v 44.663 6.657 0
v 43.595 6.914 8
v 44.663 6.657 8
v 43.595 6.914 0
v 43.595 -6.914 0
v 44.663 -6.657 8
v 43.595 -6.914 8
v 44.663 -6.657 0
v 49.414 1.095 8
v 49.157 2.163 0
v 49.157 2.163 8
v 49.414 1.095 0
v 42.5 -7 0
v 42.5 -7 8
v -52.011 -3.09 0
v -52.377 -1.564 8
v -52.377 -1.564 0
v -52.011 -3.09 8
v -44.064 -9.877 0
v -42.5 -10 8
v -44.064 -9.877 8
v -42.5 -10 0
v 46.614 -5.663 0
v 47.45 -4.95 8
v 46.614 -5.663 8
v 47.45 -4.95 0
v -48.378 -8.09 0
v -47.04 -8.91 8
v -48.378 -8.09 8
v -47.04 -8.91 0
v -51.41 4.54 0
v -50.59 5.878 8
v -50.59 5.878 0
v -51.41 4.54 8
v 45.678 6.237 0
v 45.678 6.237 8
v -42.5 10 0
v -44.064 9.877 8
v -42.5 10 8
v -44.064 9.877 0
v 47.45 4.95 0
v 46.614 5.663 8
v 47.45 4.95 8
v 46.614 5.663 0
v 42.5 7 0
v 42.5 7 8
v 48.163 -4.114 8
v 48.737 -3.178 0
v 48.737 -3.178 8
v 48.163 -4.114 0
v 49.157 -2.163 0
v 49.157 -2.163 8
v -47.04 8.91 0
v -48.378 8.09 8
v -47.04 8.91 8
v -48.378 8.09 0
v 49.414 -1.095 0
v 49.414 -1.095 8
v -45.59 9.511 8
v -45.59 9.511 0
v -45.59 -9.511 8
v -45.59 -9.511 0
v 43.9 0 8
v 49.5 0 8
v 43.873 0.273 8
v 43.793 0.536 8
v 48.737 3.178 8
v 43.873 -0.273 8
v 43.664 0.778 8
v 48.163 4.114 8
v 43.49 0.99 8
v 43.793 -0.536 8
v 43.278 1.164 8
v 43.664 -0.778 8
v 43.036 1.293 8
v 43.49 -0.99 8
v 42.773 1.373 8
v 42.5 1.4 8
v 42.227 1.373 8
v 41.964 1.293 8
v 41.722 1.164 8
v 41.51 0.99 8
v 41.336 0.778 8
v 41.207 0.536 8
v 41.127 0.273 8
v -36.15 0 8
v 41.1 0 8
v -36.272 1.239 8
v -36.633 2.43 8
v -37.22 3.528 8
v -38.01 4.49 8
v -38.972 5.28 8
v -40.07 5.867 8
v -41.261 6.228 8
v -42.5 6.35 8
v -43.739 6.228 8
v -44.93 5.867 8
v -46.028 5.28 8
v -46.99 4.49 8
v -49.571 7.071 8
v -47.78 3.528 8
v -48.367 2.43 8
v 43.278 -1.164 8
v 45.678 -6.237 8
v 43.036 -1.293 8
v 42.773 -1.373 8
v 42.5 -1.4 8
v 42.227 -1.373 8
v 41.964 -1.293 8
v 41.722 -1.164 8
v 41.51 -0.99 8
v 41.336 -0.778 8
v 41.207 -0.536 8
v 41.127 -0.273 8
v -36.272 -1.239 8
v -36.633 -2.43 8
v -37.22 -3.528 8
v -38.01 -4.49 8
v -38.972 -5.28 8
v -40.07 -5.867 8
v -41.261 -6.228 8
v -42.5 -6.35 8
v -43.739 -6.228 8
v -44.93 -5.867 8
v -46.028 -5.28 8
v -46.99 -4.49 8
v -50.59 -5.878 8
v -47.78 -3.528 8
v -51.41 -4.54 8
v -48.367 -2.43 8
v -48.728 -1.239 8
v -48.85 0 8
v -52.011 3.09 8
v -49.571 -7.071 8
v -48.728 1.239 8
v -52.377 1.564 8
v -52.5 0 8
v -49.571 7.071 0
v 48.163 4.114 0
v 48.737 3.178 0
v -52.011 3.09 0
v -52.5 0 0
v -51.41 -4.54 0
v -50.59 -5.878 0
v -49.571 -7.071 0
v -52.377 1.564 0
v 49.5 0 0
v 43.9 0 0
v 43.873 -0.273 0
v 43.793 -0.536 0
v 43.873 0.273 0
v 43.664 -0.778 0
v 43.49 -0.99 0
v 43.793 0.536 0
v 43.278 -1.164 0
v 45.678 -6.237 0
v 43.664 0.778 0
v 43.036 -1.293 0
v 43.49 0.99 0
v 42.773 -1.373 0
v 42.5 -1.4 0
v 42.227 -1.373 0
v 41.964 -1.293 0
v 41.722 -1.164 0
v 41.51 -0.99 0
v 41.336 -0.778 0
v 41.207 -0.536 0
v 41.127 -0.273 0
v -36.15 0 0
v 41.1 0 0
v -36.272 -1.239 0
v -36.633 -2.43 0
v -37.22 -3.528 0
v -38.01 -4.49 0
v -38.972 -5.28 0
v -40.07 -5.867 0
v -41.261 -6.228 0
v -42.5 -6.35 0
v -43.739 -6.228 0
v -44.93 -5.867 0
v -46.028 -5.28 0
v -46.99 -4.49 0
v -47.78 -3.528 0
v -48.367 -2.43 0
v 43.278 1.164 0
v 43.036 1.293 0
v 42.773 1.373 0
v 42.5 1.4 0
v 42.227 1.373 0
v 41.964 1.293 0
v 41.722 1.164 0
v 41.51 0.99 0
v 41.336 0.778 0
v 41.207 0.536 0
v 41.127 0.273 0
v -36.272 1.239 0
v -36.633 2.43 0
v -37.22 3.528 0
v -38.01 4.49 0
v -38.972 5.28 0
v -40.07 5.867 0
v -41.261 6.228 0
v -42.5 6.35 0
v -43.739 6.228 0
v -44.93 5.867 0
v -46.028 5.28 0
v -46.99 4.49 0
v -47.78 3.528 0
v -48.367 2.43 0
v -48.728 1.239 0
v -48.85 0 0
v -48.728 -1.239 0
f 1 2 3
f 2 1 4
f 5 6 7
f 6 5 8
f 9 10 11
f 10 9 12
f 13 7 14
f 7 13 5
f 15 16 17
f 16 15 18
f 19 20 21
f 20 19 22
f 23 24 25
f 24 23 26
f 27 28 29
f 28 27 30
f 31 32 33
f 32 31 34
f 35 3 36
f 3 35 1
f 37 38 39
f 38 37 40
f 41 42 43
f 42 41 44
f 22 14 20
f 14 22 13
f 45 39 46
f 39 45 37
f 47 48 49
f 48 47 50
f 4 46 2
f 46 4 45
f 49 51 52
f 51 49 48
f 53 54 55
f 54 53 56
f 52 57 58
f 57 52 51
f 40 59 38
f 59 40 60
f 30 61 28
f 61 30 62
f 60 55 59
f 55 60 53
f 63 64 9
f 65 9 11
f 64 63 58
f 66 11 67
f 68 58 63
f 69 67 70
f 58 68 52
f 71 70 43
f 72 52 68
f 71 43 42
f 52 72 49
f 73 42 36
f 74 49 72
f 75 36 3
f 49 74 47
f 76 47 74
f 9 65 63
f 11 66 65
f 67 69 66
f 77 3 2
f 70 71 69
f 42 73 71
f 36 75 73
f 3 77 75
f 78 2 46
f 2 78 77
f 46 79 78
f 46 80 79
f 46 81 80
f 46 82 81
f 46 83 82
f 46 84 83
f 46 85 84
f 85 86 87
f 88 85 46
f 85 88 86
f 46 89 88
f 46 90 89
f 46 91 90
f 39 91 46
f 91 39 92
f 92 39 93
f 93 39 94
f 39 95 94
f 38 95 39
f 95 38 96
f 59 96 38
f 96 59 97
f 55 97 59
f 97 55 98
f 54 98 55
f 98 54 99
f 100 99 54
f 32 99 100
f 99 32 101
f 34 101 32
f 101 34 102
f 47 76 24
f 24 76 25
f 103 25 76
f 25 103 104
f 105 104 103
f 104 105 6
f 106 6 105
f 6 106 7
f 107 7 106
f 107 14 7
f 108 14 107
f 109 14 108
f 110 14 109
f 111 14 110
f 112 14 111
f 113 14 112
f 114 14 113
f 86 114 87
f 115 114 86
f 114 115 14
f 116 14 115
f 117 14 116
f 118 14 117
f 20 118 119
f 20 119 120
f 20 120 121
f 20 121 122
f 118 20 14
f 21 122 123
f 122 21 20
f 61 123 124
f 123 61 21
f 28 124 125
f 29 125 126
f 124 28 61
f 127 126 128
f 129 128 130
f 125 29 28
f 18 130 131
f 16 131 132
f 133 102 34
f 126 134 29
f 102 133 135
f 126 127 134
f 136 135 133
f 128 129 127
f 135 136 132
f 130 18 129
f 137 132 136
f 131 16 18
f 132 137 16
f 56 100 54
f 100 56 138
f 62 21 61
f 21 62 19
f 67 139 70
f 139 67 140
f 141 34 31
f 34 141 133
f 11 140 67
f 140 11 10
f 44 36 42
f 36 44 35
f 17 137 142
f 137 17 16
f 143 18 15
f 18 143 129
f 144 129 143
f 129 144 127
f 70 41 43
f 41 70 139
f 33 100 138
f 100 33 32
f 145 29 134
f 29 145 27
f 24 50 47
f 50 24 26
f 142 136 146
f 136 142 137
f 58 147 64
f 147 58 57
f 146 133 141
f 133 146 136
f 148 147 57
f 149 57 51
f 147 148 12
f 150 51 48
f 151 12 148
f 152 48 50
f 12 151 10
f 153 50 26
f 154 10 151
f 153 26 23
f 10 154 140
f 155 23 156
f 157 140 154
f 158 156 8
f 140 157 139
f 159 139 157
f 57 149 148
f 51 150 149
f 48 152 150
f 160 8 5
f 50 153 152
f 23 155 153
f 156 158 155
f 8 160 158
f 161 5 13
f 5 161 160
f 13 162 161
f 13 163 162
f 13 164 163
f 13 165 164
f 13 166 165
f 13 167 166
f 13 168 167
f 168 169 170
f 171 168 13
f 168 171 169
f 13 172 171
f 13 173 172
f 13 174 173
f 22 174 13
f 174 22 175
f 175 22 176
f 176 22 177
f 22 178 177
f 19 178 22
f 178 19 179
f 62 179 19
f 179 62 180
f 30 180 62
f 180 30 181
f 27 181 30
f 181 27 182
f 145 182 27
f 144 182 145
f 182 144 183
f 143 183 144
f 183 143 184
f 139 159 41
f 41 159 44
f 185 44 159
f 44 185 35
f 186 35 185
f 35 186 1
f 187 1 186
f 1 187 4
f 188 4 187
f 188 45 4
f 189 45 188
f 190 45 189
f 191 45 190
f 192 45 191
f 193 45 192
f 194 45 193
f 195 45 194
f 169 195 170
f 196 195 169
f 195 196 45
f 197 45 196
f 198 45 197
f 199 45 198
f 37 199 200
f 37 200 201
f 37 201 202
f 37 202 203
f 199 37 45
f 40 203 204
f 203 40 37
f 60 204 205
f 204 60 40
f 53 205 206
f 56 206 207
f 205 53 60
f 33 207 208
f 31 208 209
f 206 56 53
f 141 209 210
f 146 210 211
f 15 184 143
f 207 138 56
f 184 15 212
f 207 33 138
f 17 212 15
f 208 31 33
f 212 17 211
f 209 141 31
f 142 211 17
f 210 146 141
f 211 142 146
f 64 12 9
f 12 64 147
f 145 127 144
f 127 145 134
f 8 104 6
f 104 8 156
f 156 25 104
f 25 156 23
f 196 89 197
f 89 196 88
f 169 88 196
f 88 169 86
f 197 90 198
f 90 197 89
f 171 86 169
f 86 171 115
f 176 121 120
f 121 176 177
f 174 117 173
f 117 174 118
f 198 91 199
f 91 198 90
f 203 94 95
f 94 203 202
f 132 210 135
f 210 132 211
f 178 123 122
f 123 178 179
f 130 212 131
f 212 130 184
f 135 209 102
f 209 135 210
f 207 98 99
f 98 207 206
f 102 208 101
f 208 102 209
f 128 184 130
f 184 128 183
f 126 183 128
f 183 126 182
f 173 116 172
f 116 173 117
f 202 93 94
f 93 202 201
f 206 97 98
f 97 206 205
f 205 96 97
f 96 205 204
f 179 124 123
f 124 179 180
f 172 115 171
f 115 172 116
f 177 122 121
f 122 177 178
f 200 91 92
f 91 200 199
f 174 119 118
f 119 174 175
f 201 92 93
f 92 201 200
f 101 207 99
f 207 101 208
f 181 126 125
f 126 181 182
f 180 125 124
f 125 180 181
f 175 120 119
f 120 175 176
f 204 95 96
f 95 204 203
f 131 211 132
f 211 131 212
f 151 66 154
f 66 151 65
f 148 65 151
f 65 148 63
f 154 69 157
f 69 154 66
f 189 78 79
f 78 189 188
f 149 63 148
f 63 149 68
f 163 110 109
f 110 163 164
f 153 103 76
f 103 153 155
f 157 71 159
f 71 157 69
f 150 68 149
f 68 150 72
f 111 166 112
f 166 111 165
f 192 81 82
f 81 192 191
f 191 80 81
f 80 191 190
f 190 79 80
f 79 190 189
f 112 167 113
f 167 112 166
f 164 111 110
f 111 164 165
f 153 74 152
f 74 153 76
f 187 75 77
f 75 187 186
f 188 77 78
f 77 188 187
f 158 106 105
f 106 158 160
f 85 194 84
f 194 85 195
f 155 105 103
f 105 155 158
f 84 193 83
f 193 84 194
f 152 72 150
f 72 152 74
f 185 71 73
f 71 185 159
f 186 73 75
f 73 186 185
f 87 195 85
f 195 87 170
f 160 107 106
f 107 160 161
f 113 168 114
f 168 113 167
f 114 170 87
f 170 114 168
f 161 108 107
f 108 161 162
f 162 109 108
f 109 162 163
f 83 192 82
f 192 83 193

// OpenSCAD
$fn = 32;

// ----------------------------------------------------------------------
// Lever: 85 mm between the bosses, 8 mm thick, smooth outline
// ----------------------------------------------------------------------

// --- parameters (mm) ---
lever_l = 85;             // distance between the boss centres
boss_a = 20;              // first boss diameter
boss_b = 14;              // second boss diameter
bore_a = 12.7;            // first bore
bore_b = 2.8;             // second bore
lever_t = 8;              // lever thickness

lever_profile = [[-52.5, 0], [-52.377, -1.564], [-52.011, -3.09], [-51.41, -4.54], [-50.59, -5.878], [-49.571, -7.071], [-48.378, -8.09], [-47.04, -8.91], [-45.59, -9.511], [-44.064, -9.877], [-42.5, -10], [42.5, -7], [43.595, -6.914], [44.663, -6.657], [45.678, -6.237], [46.614, -5.663], [47.45, -4.95], [48.163, -4.114], [48.737, -3.178], [49.157, -2.163], [49.414, -1.095], [49.5, 0], [49.414, 1.095], [49.157, 2.163], [48.737, 3.178], [48.163, 4.114], [47.45, 4.95], [46.614, 5.663], [45.678, 6.237], [44.663, 6.657], [43.595, 6.914], [42.5, 7], [-42.5, 10], [-44.064, 9.877], [-45.59, 9.511], [-47.04, 8.91], [-48.378, 8.09], [-49.571, 7.071], [-50.59, 5.878], [-51.41, 4.54], [-52.011, 3.09], [-52.377, 1.564]];

difference() {
  linear_extrude(height = lever_t) polygon(lever_profile);
  translate([-42.5, 0, -2.5]) cylinder(h = lever_t + 5, d = bore_a);
  translate([42.5, 0, -2.5]) cylinder(h = lever_t + 5, d = bore_b);
}
